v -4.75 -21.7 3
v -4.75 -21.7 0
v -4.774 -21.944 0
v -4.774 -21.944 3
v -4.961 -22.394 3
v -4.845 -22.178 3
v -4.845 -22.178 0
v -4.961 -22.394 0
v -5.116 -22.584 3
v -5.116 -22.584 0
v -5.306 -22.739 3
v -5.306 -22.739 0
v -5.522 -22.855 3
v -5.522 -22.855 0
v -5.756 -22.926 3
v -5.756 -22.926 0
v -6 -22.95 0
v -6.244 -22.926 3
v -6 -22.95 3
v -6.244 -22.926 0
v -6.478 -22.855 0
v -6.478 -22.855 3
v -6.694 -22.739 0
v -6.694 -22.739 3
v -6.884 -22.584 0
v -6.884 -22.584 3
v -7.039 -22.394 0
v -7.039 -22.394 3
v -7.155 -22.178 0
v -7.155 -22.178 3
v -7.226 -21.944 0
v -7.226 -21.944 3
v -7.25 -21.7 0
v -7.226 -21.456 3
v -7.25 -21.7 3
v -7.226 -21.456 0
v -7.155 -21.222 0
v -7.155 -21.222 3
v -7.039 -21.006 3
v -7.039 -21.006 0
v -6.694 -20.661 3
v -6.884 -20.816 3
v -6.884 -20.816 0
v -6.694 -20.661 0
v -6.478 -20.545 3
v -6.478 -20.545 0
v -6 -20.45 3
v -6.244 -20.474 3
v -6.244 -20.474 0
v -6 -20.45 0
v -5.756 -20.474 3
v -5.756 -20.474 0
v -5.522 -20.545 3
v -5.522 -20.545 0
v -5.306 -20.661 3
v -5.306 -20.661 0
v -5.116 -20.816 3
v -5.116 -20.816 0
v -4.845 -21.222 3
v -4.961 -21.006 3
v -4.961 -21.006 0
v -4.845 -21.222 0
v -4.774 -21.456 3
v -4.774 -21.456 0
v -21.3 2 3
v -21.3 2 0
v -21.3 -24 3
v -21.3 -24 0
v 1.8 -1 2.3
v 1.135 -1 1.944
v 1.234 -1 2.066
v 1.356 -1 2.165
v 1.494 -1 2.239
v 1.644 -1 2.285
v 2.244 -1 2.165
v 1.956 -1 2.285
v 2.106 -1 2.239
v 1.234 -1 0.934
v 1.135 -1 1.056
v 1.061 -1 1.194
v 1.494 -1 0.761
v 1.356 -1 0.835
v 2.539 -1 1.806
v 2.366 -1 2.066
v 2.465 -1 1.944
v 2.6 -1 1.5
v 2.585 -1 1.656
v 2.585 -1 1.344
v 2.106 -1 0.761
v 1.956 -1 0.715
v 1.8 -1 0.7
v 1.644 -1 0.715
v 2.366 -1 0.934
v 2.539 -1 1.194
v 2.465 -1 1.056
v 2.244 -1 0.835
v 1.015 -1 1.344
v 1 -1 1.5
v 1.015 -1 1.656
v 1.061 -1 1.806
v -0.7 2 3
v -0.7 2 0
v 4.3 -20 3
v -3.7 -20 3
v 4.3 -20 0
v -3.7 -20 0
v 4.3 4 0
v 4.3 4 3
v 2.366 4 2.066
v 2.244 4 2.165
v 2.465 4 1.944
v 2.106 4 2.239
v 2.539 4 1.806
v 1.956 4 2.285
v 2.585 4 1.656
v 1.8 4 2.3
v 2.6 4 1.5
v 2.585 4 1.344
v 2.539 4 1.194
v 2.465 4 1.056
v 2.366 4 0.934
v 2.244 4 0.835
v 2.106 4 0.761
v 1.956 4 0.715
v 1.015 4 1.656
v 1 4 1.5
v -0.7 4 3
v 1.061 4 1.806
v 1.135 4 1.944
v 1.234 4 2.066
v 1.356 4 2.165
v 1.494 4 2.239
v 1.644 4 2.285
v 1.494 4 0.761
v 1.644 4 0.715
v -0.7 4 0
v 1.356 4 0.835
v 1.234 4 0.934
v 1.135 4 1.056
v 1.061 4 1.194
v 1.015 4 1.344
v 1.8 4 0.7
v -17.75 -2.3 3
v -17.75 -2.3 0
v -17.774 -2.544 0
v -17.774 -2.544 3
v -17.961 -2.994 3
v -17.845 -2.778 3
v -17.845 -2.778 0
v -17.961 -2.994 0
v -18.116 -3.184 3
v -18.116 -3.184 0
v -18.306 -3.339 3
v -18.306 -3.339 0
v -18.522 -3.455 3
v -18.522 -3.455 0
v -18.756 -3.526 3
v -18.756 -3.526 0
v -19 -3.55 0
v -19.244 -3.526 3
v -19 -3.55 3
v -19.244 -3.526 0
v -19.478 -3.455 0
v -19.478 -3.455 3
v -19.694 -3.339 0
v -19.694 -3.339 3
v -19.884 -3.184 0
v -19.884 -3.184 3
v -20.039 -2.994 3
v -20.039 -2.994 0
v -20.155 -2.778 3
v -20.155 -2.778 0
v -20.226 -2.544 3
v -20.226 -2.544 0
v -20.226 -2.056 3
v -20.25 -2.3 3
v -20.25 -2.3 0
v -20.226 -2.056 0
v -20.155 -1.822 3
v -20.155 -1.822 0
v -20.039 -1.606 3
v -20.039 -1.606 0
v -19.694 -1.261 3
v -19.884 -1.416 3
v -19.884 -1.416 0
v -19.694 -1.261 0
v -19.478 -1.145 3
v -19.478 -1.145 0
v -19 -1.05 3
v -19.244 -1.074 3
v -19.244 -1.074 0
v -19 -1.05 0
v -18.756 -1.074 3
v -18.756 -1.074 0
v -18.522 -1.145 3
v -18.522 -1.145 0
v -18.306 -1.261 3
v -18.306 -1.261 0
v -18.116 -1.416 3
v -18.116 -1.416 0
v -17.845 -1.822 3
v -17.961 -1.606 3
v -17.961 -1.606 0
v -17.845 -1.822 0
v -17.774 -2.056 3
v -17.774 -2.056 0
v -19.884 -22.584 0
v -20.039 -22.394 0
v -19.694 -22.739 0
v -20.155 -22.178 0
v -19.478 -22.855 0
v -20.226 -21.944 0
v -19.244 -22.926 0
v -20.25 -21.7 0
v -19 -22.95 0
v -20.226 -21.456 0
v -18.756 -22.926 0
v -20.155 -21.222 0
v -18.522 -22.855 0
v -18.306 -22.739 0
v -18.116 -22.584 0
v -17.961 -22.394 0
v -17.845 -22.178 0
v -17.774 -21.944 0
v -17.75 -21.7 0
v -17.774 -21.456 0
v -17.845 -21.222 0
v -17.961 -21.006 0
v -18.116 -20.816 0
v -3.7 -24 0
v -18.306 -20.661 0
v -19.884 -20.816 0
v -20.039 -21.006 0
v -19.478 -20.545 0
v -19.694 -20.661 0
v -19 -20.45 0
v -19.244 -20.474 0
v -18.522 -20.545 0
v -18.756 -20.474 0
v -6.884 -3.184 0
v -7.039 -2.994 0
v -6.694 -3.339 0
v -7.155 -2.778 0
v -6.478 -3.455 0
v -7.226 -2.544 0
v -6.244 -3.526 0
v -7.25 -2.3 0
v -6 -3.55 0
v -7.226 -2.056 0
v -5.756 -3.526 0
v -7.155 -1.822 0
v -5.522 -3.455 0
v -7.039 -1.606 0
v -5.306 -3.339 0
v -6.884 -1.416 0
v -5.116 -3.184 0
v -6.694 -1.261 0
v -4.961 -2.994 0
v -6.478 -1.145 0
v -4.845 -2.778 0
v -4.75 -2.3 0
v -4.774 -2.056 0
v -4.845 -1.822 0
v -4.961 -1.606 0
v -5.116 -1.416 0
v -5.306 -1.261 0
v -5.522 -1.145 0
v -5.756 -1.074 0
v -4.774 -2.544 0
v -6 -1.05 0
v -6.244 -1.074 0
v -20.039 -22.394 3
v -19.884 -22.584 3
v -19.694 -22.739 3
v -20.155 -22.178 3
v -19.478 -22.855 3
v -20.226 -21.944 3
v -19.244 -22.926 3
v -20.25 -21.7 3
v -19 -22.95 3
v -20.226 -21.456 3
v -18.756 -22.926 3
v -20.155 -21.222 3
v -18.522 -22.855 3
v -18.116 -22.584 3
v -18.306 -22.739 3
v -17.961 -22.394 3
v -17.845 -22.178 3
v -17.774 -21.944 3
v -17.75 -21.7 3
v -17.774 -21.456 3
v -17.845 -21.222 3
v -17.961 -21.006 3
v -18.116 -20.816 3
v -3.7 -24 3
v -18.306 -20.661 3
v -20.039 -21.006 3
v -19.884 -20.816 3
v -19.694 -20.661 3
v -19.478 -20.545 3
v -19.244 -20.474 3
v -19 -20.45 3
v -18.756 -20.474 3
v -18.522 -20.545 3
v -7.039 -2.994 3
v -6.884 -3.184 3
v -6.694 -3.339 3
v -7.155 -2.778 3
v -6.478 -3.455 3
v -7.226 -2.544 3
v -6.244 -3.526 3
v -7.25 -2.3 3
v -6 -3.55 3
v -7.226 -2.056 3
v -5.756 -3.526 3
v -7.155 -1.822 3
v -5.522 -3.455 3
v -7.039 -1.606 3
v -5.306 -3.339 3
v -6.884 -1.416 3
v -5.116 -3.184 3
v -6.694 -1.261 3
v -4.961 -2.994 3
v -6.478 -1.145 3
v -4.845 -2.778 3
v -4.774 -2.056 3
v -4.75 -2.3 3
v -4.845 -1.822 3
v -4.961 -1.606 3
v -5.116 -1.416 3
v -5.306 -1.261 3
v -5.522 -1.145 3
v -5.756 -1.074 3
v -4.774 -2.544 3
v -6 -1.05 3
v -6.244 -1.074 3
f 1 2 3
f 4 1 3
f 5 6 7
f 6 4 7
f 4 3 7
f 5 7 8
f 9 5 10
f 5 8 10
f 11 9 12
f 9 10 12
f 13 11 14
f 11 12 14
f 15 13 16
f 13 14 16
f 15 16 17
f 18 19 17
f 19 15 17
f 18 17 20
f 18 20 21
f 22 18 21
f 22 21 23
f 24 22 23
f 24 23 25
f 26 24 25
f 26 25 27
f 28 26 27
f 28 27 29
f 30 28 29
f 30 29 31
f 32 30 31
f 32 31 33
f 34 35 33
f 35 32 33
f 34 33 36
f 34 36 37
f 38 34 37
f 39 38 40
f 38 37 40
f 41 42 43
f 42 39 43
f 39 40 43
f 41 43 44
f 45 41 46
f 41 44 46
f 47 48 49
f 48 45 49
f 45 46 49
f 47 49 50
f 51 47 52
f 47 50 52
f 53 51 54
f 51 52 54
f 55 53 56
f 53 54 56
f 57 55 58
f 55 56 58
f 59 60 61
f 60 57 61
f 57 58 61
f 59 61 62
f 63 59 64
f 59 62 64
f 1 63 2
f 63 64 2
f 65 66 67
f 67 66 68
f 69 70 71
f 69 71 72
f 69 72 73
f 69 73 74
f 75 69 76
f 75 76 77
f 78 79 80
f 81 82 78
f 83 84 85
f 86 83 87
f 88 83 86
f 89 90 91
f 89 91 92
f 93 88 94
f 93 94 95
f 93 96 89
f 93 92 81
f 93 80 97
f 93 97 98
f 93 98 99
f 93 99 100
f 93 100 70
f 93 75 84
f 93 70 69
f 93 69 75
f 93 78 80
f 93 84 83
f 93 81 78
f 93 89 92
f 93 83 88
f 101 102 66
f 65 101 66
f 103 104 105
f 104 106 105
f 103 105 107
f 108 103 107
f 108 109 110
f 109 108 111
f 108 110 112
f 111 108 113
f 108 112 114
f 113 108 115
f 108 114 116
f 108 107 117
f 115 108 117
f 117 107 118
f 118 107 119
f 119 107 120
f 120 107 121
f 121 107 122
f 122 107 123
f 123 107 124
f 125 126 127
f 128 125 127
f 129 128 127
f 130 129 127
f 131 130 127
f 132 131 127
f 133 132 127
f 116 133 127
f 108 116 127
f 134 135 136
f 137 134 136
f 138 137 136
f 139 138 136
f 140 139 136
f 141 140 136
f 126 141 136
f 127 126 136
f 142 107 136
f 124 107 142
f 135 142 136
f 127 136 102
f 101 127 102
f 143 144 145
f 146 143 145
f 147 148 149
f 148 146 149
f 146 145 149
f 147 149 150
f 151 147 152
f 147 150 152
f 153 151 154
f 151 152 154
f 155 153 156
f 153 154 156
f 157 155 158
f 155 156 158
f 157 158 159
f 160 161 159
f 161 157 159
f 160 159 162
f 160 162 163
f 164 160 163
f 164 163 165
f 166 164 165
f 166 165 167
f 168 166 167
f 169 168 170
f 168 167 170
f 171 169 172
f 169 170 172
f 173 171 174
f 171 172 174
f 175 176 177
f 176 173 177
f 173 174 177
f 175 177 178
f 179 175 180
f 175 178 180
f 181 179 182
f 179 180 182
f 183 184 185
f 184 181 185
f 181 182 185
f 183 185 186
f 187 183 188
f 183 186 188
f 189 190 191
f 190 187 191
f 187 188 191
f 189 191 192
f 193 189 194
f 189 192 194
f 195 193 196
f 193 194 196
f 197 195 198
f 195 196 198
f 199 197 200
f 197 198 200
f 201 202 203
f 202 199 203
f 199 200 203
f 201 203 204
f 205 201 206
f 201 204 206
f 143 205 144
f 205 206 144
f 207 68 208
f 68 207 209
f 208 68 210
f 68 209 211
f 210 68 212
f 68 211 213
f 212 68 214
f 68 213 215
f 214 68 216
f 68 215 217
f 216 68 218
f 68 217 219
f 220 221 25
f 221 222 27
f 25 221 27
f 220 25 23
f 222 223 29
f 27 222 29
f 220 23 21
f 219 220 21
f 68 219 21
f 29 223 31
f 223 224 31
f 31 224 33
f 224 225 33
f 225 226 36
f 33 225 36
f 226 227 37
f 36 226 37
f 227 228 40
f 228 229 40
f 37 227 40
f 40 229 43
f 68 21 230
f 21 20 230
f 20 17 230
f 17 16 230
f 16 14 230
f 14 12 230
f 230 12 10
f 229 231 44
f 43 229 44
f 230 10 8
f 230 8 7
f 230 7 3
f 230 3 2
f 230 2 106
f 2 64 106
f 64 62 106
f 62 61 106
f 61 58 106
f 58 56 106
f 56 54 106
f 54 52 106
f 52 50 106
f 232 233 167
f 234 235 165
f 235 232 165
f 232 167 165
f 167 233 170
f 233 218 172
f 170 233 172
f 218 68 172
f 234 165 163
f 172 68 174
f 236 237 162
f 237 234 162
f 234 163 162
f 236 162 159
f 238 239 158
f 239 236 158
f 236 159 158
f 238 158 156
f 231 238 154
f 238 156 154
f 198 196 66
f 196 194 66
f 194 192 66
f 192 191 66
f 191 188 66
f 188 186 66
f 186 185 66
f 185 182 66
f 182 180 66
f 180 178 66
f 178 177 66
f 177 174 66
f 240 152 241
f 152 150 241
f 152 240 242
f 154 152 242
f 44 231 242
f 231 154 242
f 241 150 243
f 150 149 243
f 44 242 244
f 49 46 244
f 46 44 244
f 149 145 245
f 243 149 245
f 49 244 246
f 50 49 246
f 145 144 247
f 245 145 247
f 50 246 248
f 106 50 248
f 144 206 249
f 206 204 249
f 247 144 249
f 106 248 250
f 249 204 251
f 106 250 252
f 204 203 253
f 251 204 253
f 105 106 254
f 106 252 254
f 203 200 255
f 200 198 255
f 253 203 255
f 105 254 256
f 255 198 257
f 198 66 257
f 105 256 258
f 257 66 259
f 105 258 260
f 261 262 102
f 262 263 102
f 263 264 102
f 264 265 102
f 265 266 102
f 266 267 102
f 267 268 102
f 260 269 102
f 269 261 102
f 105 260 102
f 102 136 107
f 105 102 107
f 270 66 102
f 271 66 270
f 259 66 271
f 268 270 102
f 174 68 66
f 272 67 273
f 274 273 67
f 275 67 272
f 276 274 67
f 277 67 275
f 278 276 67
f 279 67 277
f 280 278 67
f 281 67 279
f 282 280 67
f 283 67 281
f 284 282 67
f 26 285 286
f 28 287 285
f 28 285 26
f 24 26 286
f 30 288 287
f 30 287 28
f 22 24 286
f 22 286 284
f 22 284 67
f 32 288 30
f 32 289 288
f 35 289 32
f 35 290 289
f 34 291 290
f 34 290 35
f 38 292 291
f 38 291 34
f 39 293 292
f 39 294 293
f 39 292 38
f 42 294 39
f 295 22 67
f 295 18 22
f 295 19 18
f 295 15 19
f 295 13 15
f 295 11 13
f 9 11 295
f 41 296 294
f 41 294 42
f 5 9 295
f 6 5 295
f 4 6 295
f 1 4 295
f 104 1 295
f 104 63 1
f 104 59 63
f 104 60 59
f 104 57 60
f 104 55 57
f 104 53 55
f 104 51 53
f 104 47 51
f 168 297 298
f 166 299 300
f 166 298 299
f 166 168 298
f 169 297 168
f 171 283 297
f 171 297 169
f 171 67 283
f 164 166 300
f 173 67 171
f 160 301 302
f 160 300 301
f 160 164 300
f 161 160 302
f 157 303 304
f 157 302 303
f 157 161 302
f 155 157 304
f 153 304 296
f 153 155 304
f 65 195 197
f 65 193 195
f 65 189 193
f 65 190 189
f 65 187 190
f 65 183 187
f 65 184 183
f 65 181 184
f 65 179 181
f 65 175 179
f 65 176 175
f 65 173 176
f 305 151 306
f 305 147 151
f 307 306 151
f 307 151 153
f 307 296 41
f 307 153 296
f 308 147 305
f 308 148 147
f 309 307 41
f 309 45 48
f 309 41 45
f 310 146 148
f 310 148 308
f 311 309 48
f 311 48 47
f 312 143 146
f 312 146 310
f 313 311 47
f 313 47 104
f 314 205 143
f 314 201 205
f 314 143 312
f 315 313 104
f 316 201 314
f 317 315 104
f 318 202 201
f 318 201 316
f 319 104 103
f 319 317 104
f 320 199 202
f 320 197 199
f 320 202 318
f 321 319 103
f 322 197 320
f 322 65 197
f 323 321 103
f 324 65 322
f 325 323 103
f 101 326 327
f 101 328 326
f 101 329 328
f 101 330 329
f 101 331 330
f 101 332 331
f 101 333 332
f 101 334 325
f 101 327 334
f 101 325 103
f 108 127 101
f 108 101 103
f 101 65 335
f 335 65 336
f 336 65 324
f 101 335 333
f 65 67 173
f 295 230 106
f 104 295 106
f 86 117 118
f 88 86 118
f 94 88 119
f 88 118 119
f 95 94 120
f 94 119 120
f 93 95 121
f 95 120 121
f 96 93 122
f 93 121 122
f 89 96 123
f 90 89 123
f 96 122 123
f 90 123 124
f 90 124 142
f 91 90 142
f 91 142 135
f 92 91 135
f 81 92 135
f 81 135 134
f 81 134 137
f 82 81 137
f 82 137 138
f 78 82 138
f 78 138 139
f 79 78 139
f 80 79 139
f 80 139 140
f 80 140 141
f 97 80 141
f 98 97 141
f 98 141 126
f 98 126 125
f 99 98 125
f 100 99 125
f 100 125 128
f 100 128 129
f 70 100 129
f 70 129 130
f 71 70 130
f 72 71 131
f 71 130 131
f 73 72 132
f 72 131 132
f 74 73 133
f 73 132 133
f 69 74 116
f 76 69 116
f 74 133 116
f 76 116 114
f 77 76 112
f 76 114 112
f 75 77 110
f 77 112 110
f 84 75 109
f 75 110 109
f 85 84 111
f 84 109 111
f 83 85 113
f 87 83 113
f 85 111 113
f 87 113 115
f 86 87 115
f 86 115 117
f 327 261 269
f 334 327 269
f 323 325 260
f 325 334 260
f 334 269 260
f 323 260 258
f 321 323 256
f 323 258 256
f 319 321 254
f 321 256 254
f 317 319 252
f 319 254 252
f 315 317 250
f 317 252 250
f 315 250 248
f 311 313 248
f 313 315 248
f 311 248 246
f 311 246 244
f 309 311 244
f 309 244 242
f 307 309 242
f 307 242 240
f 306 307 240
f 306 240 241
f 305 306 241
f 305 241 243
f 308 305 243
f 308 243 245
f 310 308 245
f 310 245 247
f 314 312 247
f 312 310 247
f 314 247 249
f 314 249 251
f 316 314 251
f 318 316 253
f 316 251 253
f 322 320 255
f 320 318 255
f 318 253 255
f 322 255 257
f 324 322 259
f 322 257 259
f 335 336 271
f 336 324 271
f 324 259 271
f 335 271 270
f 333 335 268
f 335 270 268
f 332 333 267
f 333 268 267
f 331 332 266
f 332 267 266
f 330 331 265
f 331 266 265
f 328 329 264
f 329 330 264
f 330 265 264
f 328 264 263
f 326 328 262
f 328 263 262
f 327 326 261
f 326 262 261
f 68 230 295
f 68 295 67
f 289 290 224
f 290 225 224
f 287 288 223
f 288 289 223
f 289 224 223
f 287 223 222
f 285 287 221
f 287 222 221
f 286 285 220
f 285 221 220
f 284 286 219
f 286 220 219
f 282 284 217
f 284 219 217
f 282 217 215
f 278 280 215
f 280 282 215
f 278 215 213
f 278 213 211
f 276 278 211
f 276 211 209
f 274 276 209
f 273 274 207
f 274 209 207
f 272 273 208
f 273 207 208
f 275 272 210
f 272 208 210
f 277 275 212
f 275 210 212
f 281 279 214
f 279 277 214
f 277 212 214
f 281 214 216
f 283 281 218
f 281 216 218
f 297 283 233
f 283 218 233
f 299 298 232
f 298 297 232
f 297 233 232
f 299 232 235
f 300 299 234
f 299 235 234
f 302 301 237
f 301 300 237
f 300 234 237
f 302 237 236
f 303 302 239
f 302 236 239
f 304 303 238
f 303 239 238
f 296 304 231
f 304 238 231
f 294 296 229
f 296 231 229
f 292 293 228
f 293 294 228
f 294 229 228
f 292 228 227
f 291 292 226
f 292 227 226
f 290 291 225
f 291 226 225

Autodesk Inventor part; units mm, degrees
ref_plane "YZ Plane" through (0, 0, 0) normal (1, 0, 0) x (0, 1, 0)
ref_plane "XZ Plane" through (0, 0, 0) normal (0, 1, 0) x (-1, 0, 0)
ref_plane "作業平面1" through (0, 0, 0) normal (0, 0, 1) x (1, 0, 0)
sketch "スケッチ1" plane through (0, 0, 0) normal (0, 0, 1) x (1, 0, 0)
  circle A0 centre (-6, -21.7) radius 1.25 projected
  circle A1 centre (-19, -21.7) radius 1.25 projected
  circle A2 centre (-19, -2.3) radius 1.25 projected
  circle A3 centre (-6, -2.3) radius 1.25 projected
  line L0 (0, -24) -> (-27.3, -24) projected
  line L1 (-3.7, -24) -> (-3.7, 2)
  line L2 (-3.7, 2) -> (-21.3, 2)
  line L3 (-21.3, 2) -> (-21.3, -24)
  circle A4 centre (-6, -21.7) radius 2.3 construction
  circle A5 centre (-19, -21.7) radius 2.3 construction
  line L4 (-3.7, -20) -> (4.3, -20)
  line L5 (4.3, -20) -> (4.3, 4)
  line L6 (4.3, 4) -> (-0.7, 4)
  line L7 (-0.7, 4) -> (-0.7, 2)
  line L8 (-0.7, 2) -> (-3.7, 2)
  point P0 (0, 0)
  dimension "d0" = 26
  dimension "d3" = 3
  dimension "d4" = 5
  dimension "d5" = 2
  dimension "d6" = 24
extrude "押し出し1" add sketch "スケッチ1" along normal blind 3
sketch "スケッチ2" plane through (-0.7, 4, 0) normal (0, 1, 0) x (1, 0, 0)
  line L0 (5, 0) -> (0, 0) projected
  line L1 (0, 0) -> (0, -3) projected
  line L2 (5, -3) -> (0, -3) projected
  line L3 (5, 0) -> (5, -3) projected
  circle A0 centre (2.5, -1.5) radius 0.8
  line L4 (5, -3) -> (0, 0) construction
  line L5 (5, 0) -> (0, -3) construction
  point P0 (0.7, 0)
  dimension "d7" = 1.6
extrude "押し出し2" cut sketch "スケッチ2" against normal blind 5 contours A0
properties part number "KickerMount_R"
